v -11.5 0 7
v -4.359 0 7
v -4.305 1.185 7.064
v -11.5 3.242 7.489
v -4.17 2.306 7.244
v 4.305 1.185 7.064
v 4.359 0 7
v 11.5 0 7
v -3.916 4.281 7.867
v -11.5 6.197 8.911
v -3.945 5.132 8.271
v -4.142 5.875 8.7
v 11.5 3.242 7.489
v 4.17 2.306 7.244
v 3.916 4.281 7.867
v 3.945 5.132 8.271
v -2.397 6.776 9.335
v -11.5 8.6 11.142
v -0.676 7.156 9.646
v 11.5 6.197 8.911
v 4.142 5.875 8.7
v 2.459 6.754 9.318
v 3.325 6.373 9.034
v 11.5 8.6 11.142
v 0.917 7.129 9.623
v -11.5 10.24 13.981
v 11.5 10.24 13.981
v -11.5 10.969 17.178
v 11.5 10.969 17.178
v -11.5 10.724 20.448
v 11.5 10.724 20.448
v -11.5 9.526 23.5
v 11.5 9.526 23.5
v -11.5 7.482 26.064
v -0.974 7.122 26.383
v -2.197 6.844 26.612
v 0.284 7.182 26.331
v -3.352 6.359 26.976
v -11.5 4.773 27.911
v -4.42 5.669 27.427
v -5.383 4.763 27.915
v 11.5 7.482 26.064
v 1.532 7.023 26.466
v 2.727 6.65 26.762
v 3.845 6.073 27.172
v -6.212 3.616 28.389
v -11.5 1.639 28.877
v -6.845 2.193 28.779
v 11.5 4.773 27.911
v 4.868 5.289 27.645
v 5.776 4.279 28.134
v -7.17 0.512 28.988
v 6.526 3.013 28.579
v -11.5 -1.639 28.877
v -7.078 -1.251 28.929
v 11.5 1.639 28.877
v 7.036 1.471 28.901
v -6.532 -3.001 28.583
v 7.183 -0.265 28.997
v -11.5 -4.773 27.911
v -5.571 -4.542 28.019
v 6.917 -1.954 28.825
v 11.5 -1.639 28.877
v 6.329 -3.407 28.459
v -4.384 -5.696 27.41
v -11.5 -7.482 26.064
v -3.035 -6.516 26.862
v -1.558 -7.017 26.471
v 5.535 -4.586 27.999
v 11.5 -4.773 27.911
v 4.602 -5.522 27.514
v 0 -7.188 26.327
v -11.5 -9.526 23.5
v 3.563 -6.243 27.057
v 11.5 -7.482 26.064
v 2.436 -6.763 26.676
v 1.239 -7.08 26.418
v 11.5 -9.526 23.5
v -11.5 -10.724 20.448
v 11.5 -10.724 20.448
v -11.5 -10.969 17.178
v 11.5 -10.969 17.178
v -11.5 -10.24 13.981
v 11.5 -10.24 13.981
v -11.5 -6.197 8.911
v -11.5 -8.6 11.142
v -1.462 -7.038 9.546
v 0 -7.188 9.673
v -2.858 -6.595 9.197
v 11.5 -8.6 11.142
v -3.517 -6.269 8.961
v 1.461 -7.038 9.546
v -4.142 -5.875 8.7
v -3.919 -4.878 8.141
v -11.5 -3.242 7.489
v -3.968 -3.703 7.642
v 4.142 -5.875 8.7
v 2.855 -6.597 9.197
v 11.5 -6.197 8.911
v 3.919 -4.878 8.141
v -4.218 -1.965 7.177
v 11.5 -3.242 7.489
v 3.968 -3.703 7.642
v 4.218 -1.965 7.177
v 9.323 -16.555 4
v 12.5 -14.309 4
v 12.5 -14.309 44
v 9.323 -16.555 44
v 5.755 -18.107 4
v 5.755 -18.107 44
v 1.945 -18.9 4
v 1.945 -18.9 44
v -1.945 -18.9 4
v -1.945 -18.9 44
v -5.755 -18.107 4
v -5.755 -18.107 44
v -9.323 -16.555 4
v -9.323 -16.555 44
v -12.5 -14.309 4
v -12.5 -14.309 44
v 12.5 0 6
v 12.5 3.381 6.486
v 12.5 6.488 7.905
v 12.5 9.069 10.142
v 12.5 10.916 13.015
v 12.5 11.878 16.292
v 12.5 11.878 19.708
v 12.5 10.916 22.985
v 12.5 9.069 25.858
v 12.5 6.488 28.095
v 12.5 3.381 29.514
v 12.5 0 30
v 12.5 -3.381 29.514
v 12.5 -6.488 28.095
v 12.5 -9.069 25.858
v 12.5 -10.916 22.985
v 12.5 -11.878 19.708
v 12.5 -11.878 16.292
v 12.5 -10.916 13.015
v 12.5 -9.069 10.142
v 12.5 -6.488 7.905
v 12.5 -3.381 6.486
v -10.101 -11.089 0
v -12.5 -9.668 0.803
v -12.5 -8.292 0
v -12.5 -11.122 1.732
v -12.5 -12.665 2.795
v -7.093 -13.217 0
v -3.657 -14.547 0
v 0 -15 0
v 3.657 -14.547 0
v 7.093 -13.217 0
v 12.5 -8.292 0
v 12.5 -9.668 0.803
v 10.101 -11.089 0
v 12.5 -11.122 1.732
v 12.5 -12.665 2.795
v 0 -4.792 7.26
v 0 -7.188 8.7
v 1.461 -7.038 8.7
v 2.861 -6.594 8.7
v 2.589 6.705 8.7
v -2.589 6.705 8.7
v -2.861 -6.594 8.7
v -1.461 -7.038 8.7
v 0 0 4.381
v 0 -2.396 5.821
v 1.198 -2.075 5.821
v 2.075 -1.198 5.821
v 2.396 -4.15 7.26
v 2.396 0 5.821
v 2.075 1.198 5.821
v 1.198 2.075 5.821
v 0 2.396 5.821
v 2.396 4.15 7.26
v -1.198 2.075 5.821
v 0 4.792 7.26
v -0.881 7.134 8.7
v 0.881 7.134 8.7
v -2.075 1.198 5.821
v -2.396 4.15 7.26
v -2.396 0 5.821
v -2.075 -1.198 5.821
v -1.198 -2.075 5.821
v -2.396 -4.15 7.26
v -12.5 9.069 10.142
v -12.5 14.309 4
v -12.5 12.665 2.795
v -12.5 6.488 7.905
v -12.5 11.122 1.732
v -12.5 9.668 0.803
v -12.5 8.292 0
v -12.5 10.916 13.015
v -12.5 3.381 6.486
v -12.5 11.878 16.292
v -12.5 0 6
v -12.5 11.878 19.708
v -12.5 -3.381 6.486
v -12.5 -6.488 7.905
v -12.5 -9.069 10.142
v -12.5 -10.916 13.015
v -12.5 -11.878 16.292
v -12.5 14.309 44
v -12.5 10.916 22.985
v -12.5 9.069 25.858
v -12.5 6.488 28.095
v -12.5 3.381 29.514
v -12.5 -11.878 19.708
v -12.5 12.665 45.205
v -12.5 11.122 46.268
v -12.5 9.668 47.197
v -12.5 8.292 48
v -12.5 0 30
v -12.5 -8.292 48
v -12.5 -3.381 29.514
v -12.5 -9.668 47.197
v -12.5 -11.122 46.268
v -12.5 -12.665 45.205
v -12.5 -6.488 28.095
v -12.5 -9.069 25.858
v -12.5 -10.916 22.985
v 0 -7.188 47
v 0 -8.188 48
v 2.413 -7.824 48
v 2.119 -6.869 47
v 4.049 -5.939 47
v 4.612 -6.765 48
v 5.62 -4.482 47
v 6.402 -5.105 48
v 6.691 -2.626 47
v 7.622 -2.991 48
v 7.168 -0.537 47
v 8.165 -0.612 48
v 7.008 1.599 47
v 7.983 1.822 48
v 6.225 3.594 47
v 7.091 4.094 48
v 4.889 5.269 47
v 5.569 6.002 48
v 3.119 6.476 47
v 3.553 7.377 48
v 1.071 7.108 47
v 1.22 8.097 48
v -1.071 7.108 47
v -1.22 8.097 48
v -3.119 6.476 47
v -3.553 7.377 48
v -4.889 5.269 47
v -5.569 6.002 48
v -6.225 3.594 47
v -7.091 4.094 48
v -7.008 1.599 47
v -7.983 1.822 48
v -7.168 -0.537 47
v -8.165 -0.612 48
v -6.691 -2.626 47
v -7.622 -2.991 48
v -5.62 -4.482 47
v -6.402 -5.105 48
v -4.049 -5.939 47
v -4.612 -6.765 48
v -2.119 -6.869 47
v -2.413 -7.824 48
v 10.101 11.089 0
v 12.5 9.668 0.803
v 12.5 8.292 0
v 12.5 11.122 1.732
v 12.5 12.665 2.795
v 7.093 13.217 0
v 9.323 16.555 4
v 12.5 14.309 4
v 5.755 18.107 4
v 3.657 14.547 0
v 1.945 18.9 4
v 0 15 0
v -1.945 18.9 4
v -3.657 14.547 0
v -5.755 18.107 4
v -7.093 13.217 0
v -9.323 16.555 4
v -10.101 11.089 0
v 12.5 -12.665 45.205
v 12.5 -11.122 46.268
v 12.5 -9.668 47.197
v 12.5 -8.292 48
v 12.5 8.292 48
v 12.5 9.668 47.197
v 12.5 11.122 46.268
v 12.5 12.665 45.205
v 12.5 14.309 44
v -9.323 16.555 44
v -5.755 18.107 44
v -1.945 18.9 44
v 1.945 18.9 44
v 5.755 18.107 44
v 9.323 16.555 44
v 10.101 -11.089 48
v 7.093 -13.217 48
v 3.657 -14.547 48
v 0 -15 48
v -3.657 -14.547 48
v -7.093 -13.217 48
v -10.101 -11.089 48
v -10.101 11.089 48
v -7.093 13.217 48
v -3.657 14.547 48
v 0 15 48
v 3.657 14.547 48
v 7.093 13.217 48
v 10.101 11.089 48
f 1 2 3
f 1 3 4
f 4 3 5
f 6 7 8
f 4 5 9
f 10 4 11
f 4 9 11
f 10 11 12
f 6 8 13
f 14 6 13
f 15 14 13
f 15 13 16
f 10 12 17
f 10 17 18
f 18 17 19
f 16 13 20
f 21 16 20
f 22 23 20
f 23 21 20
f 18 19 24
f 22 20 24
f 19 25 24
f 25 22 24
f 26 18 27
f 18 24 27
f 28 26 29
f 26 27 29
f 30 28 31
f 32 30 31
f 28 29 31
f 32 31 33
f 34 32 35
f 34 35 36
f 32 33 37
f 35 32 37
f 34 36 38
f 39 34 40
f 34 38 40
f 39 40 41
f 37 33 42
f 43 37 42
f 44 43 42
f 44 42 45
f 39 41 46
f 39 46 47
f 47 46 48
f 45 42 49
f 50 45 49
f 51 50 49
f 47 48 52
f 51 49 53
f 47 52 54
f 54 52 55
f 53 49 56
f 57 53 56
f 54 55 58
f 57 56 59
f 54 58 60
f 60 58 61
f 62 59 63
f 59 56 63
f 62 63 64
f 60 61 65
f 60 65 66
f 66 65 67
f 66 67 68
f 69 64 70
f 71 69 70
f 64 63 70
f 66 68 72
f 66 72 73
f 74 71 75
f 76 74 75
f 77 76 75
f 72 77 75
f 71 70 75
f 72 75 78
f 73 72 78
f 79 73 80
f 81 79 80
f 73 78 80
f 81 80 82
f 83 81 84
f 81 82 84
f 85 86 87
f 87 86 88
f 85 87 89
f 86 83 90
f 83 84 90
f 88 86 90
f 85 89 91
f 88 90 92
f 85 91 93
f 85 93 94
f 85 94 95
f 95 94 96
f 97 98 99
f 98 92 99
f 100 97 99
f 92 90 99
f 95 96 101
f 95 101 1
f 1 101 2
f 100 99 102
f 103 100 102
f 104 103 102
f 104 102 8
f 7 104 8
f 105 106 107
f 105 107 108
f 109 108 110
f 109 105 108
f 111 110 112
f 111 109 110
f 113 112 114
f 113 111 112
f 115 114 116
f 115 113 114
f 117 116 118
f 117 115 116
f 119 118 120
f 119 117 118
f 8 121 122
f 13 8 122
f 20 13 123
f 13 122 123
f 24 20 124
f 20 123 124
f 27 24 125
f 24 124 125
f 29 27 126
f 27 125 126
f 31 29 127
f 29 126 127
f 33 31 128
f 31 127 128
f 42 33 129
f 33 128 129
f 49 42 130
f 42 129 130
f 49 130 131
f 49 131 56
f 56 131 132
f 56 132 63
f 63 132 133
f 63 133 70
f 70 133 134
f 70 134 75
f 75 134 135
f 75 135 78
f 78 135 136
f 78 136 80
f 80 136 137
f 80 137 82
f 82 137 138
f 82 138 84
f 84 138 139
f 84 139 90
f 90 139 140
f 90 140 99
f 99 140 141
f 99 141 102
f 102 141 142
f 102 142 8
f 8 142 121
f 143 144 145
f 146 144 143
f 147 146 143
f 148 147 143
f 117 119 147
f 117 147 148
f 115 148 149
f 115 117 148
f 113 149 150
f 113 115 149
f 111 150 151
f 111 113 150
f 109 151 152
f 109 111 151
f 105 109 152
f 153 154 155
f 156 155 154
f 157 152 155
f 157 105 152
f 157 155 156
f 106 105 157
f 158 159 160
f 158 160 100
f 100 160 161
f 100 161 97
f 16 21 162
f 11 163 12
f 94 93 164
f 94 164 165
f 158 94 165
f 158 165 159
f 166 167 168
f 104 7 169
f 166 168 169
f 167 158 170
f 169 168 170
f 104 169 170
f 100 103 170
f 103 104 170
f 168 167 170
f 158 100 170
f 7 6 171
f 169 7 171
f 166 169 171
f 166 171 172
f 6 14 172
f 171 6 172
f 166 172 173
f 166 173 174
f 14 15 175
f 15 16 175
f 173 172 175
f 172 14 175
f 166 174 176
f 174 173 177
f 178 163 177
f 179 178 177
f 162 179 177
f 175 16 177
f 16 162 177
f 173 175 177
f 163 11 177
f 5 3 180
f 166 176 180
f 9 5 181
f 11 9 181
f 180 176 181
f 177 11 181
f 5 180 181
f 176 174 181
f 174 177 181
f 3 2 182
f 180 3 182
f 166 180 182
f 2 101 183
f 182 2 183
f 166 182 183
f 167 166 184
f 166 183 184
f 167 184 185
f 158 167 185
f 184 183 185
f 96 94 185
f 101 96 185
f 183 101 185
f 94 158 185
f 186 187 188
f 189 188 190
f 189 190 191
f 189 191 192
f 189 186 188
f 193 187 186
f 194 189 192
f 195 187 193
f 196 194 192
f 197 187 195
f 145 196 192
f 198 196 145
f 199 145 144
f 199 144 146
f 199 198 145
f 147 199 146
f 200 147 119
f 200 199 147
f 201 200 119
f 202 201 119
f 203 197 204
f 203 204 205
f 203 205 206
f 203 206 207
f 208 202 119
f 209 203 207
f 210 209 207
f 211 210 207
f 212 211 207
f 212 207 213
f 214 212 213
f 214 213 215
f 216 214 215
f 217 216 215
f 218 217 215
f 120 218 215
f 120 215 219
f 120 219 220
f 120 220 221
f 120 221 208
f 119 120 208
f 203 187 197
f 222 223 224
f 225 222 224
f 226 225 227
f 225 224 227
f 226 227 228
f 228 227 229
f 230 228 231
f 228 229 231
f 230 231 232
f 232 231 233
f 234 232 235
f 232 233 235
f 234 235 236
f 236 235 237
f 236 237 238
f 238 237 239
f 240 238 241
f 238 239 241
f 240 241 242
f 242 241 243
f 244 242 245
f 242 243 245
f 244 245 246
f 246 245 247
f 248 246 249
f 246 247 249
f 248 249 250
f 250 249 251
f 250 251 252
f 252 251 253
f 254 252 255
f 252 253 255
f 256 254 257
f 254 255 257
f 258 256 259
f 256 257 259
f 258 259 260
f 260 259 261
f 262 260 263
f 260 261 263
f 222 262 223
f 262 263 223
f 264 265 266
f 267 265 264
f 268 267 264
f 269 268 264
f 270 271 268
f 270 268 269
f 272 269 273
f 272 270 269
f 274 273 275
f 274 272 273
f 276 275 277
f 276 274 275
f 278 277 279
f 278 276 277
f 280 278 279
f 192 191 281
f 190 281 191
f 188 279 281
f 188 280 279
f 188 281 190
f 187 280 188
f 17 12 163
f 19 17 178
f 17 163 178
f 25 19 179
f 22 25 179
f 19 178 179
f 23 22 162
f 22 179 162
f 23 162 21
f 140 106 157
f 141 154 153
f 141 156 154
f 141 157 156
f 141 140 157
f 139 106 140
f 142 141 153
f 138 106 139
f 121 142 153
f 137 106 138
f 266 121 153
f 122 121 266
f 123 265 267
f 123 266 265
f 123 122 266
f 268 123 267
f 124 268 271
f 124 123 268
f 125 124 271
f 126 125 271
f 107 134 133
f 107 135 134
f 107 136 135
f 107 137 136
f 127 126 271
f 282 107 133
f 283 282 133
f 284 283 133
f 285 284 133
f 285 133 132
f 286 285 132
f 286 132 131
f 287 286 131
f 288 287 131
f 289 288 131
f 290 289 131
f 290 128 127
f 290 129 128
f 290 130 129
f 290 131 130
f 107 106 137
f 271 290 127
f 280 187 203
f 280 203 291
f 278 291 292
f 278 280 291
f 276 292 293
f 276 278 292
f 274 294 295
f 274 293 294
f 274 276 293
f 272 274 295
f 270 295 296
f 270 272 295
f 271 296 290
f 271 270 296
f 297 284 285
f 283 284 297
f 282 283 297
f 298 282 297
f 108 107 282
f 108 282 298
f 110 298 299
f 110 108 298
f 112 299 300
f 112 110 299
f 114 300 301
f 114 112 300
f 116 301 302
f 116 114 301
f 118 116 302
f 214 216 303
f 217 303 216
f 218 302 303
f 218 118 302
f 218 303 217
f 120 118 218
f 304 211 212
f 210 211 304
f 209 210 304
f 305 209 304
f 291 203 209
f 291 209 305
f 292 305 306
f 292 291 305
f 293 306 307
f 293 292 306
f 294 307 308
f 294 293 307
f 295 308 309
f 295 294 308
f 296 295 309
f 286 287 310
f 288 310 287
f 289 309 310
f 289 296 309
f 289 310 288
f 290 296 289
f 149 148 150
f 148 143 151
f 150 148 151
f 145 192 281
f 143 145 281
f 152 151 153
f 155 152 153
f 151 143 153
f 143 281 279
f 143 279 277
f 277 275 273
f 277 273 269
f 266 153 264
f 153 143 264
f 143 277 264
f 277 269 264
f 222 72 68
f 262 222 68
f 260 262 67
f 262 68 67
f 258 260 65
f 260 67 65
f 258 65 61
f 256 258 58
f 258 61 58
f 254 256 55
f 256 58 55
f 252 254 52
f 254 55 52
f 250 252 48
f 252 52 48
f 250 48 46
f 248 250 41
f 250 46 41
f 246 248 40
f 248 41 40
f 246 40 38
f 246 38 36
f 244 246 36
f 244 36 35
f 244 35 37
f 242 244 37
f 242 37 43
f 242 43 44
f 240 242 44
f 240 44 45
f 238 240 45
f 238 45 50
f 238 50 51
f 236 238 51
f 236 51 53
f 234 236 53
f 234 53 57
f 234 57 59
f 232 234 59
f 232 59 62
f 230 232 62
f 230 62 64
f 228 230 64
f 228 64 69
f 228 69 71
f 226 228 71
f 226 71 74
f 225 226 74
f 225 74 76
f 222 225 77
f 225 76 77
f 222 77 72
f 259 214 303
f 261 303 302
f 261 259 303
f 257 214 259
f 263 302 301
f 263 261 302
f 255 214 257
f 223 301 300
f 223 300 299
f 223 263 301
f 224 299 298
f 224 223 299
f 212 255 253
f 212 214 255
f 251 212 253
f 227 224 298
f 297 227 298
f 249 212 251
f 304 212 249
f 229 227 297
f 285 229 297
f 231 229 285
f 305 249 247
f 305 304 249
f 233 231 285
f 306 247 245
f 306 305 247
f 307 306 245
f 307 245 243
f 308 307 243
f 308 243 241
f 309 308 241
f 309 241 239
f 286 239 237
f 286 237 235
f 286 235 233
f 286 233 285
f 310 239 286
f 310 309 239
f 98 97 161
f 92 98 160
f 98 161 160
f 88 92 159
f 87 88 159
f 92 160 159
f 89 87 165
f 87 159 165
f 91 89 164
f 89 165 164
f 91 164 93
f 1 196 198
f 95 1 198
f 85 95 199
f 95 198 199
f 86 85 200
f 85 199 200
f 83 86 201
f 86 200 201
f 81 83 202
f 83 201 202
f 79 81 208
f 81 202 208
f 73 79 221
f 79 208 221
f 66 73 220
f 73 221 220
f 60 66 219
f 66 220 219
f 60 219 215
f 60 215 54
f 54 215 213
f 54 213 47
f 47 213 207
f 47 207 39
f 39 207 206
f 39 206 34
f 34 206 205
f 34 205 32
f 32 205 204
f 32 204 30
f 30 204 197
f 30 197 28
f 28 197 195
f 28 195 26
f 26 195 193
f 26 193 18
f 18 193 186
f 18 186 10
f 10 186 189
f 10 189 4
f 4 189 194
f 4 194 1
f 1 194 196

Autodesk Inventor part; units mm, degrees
ref_plane "YZ Plane" through (0, 0, 0) normal (1, 0, 0) x (0, 1, 0)
ref_plane "XZ Plane" through (0, 0, 0) normal (0, 1, 0) x (-1, 0, 0)
ref_plane "XY Plane" through (0, 0, 0) normal (0, 0, 1) x (1, 0, 0)
sketch "Sketch1" plane through (0, 0, 0) normal (0, 0, 1) x (1, 0, 0)
  circle A0 centre (0, 0) radius 19
  dimension "d0" = 38
extrude "Extrusion1" add sketch "Sketch1" along normal blind 48
sketch "Sketch2" plane through (0, 0, 48) normal (0, 0, 1) x (1, 0, 0)
  line L0 (12.5, 21.9531) -> (30.6636, 21.9531)
  line L1 (30.6636, 21.9531) -> (30.6636, -19.8764)
  line L2 (30.6636, -19.8764) -> (12.5, -19.8764)
  line L3 (12.5, -19.8764) -> (12.5, 21.9531)
  point P0 (0, 0)
  dimension "d3" = 12.5
extrude "Extrusion2" cut sketch "Sketch2" against normal through all
pattern_circular "Circular Pattern1" count 2 over 360 about axis through (0, 0, 0) along (0, 0, 1) of "Extrusion2"
sketch "Sketch3" plane through (12.5, -14.3091, 48) normal (1, 0, 0) x (0, 0, -1)
  circle A0 centre (30, 14.3091) radius 11
  line L0 (48, 28.6182) -> (48, 0) projected
  point P0 (48, 14.3091)
  point P1 (48, 14.3091)
  dimension "d9" = 22
  dimension "d10" = 18
extrude "Extrusion3" cut sketch "Sketch3" against normal through all
sketch "Sketch4" plane through (0, 0, 48) normal (0, 0, 1) x (1, 0, 0)
  arc A0 (12.5, 14.3091) -> (-12.5, 14.3091) centre (0, 0) ccw projected
hole "Hole1" at (0, 0, 48) direction (0, 0, -1) diameter 14.376 depth 39.3 tip angle 118 thread size "M16x1.5" class "6H" standard "ISO Metric profile"
chamfer "Chamfer1" distance 4 angle 45 4 edges at (0, 19, 0) (0, -19, 0) (0, 19, 48) (0, -19, 48)
chamfer "Chamfer2" distance 1 angle 45 1 edges at (0, 7.188, 48)
chamfer "Chamfer3" distance 1 angle 45 2 edges at (12.5, 0, 29) (-12.5, 0, 29)
properties part number "IMS-01-002" material "Steel, Carbon"
